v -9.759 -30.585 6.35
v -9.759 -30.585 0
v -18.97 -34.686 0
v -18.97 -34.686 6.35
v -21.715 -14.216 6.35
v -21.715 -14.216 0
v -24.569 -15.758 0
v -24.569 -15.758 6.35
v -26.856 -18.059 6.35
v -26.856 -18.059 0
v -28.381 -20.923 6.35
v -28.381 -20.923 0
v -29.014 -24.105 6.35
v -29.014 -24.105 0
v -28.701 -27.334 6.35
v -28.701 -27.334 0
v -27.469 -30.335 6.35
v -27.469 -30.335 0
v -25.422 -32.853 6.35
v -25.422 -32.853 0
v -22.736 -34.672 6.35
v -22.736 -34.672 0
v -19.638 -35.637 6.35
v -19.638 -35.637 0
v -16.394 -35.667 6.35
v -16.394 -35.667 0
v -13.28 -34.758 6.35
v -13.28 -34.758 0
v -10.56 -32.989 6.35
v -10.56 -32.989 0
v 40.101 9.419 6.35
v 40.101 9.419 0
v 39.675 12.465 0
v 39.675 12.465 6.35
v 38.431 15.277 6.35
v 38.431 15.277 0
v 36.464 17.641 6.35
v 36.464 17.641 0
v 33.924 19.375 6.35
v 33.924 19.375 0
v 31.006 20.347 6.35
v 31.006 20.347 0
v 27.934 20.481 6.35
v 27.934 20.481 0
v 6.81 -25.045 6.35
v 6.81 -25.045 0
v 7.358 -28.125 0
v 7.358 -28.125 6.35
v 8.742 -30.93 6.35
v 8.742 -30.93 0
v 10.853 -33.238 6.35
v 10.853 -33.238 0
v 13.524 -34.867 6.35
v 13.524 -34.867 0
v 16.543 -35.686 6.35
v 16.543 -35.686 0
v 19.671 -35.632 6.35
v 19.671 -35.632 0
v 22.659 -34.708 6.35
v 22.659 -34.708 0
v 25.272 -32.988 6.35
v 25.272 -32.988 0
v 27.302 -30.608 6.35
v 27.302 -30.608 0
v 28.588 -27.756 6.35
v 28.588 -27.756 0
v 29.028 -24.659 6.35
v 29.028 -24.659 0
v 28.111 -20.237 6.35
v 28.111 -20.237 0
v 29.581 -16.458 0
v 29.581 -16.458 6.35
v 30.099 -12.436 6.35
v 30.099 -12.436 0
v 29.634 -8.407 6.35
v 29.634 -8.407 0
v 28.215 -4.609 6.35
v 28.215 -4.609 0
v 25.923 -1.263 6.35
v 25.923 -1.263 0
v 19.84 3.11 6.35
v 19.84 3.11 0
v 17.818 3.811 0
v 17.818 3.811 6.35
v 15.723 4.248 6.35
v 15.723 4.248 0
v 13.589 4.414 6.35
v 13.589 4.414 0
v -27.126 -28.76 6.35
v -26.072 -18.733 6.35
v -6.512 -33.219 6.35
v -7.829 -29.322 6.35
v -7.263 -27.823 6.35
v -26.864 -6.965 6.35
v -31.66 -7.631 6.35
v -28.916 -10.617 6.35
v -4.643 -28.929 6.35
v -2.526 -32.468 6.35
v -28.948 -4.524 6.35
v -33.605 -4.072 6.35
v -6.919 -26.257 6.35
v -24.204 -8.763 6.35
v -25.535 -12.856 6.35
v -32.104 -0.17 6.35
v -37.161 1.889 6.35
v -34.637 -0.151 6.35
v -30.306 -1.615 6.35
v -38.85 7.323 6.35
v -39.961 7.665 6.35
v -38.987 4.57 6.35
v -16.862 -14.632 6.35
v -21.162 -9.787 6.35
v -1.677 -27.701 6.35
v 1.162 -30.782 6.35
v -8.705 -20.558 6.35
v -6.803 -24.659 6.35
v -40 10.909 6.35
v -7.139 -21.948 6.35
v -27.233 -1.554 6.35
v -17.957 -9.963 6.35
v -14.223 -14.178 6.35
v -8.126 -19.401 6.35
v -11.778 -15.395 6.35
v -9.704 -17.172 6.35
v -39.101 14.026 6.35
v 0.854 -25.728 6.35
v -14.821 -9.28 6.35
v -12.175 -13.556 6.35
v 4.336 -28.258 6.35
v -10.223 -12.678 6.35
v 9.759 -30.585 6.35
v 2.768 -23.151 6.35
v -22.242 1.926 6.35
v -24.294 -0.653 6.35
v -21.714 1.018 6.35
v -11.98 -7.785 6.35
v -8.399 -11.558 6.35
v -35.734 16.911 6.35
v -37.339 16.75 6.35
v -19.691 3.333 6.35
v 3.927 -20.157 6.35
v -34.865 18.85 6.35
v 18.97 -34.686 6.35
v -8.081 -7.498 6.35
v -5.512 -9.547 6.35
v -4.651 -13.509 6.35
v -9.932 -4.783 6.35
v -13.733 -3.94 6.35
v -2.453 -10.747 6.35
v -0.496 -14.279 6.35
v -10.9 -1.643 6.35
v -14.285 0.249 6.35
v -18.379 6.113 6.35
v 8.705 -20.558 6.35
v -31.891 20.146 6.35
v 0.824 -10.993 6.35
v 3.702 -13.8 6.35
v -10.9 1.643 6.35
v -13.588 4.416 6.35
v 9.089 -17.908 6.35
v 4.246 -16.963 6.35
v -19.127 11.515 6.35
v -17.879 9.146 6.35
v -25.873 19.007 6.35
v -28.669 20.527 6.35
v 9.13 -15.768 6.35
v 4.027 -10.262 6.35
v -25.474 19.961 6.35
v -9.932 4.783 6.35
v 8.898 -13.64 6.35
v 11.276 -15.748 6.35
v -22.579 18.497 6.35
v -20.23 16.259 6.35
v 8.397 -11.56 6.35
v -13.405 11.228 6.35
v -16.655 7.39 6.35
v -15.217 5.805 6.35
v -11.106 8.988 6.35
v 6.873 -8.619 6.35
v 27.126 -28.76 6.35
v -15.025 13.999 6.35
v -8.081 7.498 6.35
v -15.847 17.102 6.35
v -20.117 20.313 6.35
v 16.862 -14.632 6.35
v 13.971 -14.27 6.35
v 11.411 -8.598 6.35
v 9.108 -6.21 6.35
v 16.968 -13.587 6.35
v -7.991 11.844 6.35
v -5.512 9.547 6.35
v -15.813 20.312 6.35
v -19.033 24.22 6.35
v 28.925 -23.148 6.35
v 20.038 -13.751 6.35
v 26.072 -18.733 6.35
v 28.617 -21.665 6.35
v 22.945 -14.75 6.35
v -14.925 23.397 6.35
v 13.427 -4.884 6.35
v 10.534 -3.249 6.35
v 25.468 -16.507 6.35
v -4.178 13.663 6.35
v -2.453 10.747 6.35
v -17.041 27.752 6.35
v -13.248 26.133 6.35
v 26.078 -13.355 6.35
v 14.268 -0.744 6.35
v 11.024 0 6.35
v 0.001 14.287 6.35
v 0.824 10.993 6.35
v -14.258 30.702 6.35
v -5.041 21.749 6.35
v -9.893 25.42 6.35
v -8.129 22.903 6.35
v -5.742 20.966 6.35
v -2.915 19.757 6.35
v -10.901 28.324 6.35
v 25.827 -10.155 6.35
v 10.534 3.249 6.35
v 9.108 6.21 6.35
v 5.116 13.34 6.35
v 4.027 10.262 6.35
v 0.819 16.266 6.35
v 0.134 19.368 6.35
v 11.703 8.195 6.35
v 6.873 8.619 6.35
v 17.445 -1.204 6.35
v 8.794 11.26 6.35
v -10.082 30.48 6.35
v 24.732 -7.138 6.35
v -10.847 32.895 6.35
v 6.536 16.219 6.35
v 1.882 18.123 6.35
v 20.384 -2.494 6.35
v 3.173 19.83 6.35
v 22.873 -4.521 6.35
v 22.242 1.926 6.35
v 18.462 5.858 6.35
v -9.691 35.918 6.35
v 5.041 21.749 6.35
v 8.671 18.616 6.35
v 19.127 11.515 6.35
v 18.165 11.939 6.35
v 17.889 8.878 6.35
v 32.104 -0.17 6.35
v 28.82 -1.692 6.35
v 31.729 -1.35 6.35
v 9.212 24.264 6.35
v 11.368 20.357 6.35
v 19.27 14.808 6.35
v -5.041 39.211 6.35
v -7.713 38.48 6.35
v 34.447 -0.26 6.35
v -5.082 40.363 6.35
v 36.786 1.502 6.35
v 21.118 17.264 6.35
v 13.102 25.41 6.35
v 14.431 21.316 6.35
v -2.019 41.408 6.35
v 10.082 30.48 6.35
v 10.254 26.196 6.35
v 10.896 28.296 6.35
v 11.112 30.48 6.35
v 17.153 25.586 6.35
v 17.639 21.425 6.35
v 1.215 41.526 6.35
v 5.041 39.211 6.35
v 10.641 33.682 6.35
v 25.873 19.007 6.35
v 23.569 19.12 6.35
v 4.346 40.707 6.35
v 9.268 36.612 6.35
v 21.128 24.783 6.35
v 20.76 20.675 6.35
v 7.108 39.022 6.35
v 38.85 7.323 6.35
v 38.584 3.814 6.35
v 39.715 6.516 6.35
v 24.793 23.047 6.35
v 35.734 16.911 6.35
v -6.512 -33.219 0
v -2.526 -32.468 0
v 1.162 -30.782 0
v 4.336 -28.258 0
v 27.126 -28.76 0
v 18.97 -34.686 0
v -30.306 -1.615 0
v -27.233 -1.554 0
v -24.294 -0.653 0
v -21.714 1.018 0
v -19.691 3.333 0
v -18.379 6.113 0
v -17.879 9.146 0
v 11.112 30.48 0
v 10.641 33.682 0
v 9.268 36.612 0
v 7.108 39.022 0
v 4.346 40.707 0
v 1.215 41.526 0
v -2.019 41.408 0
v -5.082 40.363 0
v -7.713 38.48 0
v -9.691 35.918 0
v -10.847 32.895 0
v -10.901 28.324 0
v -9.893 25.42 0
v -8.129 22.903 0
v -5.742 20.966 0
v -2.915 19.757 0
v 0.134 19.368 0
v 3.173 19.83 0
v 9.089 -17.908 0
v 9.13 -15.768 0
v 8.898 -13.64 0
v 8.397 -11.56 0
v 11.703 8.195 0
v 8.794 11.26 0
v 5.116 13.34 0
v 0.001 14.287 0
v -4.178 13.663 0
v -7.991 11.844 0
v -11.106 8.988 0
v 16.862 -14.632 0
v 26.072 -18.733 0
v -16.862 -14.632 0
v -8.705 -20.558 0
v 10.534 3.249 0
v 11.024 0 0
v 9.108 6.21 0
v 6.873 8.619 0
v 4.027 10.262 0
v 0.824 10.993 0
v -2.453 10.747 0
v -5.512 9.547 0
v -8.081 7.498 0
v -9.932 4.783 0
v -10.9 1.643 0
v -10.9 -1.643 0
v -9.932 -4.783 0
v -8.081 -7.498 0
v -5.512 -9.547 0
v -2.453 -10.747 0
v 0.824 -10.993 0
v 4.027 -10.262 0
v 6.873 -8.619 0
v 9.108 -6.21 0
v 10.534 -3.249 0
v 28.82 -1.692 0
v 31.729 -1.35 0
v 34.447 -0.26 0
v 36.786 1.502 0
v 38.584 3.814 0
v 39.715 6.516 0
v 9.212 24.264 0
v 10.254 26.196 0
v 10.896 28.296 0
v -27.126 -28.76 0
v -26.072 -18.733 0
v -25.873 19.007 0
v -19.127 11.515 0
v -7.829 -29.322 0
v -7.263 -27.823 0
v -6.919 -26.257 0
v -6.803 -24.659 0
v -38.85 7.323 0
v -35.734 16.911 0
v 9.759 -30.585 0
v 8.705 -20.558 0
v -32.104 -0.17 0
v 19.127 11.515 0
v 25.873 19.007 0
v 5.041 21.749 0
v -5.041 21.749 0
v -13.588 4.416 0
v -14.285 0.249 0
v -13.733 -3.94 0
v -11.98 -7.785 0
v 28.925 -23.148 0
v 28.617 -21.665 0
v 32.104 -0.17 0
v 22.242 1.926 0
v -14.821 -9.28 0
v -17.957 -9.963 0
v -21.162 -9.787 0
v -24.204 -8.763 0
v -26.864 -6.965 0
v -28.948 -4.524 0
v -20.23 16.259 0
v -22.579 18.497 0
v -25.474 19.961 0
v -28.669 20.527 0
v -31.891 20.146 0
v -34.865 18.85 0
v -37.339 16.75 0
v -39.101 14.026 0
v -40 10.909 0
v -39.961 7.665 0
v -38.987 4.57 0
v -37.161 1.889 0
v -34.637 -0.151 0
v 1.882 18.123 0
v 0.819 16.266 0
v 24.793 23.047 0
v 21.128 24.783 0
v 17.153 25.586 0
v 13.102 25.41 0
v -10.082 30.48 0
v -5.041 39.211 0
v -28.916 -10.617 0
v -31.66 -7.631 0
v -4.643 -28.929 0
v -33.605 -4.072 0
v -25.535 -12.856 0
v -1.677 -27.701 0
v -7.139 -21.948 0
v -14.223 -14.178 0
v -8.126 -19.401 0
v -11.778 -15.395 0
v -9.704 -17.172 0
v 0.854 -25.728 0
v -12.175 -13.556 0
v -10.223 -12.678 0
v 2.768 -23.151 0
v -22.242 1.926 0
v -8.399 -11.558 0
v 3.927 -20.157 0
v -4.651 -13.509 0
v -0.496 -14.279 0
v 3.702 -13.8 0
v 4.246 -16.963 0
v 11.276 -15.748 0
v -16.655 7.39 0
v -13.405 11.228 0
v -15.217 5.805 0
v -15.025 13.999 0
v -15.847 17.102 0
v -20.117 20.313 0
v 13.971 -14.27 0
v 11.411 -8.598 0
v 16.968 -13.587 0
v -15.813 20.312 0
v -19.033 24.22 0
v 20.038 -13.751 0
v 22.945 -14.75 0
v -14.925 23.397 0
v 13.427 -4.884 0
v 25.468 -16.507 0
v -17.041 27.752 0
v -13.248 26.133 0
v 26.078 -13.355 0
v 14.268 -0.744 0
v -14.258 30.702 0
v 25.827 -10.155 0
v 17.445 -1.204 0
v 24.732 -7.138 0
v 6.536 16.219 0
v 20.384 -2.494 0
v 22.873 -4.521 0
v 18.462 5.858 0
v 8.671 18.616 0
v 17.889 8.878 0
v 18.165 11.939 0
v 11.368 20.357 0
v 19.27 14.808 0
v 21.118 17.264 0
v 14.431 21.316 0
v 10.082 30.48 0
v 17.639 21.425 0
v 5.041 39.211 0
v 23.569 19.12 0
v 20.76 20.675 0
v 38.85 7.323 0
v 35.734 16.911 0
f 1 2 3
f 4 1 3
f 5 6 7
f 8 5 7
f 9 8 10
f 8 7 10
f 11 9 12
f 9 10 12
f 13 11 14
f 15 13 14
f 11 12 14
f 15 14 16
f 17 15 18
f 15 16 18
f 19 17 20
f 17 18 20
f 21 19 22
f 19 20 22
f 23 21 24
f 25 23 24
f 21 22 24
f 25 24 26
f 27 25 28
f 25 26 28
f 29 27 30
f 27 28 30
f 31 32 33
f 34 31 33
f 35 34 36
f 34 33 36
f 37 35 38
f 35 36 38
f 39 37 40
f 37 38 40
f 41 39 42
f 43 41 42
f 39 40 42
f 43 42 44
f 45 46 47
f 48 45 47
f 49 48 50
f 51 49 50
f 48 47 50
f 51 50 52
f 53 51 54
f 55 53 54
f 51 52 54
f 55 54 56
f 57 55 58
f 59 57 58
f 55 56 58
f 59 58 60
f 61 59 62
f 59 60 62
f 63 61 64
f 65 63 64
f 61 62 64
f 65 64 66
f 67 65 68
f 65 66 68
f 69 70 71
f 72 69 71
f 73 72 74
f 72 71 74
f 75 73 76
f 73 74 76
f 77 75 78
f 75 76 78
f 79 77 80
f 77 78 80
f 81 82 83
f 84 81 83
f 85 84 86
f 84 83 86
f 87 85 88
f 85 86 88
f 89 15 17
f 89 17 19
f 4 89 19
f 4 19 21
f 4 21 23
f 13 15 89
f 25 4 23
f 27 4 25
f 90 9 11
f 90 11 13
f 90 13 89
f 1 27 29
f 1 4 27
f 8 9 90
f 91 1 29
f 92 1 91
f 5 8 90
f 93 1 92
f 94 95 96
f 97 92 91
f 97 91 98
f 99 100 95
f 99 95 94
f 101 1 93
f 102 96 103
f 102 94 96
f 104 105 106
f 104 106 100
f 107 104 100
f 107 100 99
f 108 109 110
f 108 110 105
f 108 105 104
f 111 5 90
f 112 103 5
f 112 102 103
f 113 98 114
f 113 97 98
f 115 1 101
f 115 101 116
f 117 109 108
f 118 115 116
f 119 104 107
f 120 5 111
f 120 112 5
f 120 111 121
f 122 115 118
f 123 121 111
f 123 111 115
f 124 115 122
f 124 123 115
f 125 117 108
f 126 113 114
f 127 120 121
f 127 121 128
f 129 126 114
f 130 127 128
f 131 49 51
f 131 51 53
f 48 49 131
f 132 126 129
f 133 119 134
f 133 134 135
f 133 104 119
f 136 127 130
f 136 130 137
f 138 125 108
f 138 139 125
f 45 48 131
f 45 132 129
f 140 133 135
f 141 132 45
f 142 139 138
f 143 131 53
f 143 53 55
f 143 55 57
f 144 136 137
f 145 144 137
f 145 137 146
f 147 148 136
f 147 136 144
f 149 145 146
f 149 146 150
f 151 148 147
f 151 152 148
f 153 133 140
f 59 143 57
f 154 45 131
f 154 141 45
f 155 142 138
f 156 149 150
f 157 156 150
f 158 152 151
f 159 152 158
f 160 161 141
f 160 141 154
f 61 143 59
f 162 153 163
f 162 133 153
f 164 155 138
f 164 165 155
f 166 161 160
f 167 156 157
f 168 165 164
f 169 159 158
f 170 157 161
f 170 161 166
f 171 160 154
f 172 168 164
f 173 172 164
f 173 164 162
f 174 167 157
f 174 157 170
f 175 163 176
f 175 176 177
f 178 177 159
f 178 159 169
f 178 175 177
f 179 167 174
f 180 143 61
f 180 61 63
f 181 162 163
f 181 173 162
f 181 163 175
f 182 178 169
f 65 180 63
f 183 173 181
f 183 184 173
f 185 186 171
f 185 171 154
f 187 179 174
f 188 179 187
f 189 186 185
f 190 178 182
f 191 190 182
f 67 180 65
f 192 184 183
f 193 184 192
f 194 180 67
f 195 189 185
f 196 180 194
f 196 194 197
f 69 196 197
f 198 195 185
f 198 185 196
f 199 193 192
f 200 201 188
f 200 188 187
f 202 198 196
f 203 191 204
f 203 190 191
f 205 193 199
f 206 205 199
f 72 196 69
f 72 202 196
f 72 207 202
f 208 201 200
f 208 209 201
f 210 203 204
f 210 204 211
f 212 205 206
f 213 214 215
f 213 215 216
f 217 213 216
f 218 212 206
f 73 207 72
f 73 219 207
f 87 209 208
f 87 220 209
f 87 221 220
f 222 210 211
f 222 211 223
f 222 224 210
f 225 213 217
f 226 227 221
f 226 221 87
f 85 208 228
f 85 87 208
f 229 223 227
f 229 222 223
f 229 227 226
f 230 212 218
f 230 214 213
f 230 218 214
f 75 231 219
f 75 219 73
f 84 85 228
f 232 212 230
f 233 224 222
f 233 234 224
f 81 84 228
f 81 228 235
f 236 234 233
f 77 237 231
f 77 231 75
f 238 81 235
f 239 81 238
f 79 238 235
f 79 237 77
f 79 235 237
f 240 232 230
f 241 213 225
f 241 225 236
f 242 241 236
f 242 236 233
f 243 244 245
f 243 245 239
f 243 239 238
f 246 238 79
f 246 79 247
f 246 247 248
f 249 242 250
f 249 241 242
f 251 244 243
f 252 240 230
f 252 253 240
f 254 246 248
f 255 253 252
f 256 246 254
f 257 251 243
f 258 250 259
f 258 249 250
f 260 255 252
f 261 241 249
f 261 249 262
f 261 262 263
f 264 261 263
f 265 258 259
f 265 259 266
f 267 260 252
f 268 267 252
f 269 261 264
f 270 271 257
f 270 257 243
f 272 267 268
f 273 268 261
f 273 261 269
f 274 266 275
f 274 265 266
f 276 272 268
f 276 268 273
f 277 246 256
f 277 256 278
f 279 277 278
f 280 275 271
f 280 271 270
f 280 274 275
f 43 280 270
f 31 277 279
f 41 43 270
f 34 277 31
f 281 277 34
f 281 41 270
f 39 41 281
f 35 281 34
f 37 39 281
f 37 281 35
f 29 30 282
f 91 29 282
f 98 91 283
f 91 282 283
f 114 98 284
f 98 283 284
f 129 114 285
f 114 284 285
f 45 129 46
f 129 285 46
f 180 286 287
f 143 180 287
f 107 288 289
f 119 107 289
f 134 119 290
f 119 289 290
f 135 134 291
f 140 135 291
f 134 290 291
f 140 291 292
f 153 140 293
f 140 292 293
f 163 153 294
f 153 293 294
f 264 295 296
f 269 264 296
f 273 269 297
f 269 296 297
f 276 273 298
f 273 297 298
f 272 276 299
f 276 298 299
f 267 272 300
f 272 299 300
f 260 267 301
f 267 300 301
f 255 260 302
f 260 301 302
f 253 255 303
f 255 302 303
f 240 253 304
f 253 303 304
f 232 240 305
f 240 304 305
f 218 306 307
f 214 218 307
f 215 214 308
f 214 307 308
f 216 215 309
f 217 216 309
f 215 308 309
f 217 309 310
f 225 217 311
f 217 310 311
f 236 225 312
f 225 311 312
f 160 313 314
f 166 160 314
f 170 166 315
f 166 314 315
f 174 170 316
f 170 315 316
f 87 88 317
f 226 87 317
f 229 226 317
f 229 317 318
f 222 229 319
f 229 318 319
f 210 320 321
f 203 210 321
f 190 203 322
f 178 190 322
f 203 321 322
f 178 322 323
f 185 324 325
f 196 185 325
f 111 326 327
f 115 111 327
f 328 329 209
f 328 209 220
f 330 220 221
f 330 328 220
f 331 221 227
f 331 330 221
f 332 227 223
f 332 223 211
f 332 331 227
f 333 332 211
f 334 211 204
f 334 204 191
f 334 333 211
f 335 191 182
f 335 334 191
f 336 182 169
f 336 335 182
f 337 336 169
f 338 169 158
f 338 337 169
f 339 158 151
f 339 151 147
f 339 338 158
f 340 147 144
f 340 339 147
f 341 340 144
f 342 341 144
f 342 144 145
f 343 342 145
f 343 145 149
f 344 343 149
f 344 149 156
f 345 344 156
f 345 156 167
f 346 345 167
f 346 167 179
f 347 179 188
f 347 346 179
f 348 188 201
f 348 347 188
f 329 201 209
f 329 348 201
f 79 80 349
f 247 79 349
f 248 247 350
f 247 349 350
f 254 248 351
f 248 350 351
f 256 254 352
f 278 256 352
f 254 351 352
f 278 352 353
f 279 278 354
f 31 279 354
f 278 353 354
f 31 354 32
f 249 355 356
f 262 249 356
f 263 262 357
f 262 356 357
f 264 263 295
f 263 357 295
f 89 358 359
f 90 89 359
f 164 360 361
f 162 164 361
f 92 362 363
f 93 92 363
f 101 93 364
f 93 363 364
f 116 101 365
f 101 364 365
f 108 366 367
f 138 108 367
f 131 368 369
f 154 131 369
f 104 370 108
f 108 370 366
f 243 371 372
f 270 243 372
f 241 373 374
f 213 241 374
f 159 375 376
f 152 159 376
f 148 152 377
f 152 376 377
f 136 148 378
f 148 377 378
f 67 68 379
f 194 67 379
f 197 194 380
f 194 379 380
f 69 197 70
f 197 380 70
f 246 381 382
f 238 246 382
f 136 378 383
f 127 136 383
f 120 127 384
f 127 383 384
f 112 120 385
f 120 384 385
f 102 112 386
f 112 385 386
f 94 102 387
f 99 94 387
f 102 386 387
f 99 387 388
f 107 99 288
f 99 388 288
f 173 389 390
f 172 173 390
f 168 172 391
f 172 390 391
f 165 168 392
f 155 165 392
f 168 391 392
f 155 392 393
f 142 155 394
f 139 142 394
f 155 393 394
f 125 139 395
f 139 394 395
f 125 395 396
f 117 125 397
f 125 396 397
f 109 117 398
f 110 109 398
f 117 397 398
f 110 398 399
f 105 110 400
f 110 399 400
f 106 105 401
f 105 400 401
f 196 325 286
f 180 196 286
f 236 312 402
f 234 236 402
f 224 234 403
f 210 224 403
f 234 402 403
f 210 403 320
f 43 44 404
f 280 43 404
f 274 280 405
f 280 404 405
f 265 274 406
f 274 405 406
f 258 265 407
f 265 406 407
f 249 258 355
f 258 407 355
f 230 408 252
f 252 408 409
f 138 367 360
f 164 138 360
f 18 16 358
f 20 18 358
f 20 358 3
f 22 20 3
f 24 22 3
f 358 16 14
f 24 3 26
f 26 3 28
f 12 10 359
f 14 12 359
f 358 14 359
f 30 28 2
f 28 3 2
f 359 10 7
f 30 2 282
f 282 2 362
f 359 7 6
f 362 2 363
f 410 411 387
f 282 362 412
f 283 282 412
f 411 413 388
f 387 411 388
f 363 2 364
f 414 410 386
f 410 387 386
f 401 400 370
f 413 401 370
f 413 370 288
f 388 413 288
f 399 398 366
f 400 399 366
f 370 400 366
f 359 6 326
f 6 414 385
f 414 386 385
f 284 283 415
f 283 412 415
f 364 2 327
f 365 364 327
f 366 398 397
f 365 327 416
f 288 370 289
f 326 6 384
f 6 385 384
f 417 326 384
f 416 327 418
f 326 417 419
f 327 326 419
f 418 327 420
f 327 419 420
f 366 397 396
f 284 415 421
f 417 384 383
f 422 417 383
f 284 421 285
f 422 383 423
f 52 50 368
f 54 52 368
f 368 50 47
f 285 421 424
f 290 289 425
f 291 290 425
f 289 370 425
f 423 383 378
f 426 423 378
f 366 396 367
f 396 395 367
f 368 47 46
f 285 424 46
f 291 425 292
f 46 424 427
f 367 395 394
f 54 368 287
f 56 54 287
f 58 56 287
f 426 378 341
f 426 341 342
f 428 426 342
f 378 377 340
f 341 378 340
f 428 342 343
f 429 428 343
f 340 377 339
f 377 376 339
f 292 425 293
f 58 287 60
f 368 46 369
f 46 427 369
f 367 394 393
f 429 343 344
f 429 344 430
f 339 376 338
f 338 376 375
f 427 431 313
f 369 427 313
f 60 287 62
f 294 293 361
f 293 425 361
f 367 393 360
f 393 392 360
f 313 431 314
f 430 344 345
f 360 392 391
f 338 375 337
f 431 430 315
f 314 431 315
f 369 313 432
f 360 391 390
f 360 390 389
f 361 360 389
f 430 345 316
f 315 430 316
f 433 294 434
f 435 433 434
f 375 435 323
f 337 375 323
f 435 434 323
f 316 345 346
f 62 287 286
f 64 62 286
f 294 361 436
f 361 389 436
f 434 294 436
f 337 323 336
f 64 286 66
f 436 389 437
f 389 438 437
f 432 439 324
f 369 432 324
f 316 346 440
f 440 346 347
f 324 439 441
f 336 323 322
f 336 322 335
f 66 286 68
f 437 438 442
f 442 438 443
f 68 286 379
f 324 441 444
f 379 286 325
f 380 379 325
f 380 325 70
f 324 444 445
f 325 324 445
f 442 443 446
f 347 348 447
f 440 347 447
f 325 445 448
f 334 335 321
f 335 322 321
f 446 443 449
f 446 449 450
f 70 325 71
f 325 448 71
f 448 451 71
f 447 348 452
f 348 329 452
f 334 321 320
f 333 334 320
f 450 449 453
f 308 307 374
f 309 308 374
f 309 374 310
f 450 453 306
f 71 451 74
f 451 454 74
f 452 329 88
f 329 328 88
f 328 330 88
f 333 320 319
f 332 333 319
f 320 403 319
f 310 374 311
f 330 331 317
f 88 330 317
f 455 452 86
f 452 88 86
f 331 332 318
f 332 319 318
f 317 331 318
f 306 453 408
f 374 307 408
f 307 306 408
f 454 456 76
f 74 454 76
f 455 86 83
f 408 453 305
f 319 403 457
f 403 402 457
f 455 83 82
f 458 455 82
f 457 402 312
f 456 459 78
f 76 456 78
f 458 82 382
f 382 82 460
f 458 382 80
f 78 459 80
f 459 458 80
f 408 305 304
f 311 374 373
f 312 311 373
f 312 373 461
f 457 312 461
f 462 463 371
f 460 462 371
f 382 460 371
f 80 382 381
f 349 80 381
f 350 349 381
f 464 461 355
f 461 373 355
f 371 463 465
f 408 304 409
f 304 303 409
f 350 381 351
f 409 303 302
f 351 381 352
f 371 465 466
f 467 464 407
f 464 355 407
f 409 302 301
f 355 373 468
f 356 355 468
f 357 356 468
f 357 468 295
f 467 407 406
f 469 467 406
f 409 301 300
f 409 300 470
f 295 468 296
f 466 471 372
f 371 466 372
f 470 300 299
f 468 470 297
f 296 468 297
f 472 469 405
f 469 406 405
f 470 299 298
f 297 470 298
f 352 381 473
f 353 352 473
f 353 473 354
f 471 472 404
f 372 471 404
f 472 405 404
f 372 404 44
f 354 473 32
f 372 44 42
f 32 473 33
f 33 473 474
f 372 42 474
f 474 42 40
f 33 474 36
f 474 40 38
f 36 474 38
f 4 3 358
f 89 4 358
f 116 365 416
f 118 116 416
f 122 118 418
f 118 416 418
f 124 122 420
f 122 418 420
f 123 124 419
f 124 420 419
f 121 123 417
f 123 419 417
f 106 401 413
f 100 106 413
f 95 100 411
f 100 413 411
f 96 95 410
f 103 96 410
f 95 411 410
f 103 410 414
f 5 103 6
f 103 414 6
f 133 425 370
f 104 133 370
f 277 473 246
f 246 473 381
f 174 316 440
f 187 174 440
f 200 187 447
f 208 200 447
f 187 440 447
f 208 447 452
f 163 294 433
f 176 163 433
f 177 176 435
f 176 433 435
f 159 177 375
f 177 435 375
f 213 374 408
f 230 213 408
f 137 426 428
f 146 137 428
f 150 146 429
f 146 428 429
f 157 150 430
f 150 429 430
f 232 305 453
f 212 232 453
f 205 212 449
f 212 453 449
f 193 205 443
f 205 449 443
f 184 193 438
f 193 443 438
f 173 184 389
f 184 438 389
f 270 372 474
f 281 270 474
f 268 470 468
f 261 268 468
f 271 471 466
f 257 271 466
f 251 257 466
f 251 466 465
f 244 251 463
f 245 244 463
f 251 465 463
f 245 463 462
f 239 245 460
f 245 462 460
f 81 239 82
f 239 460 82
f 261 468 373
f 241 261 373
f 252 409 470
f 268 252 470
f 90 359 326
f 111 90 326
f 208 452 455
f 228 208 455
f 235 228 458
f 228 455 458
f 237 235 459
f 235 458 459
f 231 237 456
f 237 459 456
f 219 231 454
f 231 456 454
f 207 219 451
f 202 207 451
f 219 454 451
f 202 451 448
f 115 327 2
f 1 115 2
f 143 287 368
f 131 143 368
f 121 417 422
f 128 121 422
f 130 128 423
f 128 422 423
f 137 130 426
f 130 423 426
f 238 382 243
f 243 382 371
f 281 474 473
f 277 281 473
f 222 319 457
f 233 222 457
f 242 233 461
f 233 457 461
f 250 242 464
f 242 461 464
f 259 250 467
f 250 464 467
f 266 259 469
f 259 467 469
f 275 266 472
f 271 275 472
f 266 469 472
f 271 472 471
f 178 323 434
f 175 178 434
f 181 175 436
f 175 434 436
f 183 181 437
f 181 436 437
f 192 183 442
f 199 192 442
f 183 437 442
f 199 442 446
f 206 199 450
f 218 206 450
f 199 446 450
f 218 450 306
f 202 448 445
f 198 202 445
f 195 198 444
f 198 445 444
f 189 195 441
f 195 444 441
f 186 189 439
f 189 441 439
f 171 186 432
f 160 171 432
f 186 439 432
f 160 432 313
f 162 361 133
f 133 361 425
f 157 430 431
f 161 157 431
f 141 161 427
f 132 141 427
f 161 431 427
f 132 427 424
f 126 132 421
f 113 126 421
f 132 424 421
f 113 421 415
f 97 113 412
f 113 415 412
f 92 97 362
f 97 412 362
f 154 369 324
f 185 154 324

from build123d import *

# Parameters (mm, degrees)
F0_R     = 11.0236
F1_DEPTH = 6.35


with BuildPart() as f1:
    # F0 (on Top) → F1 (new body)
    with BuildSketch(Plane.XY):
        with BuildLine():
            ThreePointArc((-10.9013073569, 28.323810268), (-5.7416369548, 20.9657337998), (3.1731830809, 19.8301847253))
            ThreePointArc((3.1731830809, 19.8301847253), (5.9411817185, 22.3894795146), (9.2116796693, 24.2644860293))
            ThreePointArc((9.2116796693, 24.2644860293), (10.6266750815, 27.2301641638), (11.1125, 30.48))
            ThreePointArc((11.1125, 30.48), (1.2150273194, 41.5258754684), (-10.8468007628, 32.8954853473))
            ThreePointArc((-10.8468007628, 32.8954853473), (-11.1117102623, 30.6124813052), (-10.9013073569, 28.323810268))
        make_face()
        Polygon((10.0819790757, 30.48), (5.0409895379, 21.74875), (-5.0409895379, 21.74875), (-10.0819790757, 30.48), (-5.0409895379, 39.21125), (5.0409895379, 39.21125), align=None, mode=Mode.SUBTRACT)
        with BuildLine():
            ThreePointArc((-30.3062335558, -1.6152206797), (-21.7138611437, 1.0181468036), (-17.8790589041, 9.1457405282))
            ThreePointArc((-17.8790589041, 9.1457405282), (-19.4577342712, 12.5691292531), (-20.2303319881, 16.2589665183))
            ThreePointArc((-20.2303319881, 16.2589665183), (-37.3389530107, 16.7504560982), (-34.6373114666, -0.1506565358))
            ThreePointArc((-34.6373114666, -0.1506565358), (-32.5479071329, -1.1080874889), (-30.3062335558, -1.6152206797))
        make_face()
        Polygon((-22.2420418444, 1.9264674079), (-32.103705488, -0.1696939086), (-38.8498662602, 7.3226766721), (-35.7343633889, 16.9112085692), (-25.8726997453, 19.0073698857), (-19.1265389731, 11.514999305), align=None, mode=Mode.SUBTRACT)
        with BuildLine():
            ThreePointArc((-14.2230491705, -14.1778062266), (-11.1849106676, -13.1482774657), (-8.3989318902, -11.5581399608))
            ThreePointArc((-8.3989318902, -11.5581399608), (-10.3627655441, -9.835941568), (-11.980250366, -7.7850020821))
            ThreePointArc((-11.980250366, -7.7850020821), (-22.7179291909, -9.3773746133), (-30.3062335558, -1.6152206797))
            ThreePointArc((-30.3062335558, -1.6152206797), (-32.5479071329, -1.1080874889), (-34.6373114666, -0.1506565358))
            ThreePointArc((-34.6373114666, -0.1506565358), (-30.3789037171, -9.207206787), (-21.7147124417, -14.215892099))
            ThreePointArc((-21.7147124417, -14.215892099), (-17.9721871235, -13.5464815853), (-14.2230491705, -14.1778062266))
        make_face()
        with BuildLine():
            ThreePointArc((-13.5878570147, 4.4161972328), (-12.556806984, 6.8161025973), (-11.1060779195, 8.9881972328))
            ThreePointArc((-11.1060779195, 8.9881972328), (-15.9386394287, 18.7082664756), (-10.9013073569, 28.323810268))
            ThreePointArc((-10.9013073569, 28.323810268), (-11.1117102623, 30.6124813052), (-10.8468007628, 32.8954853473))
            ThreePointArc((-10.8468007628, 32.8954853473), (-18.1441715308, 26.0468709702), (-20.2303319881, 16.2589665183))
            ThreePointArc((-20.2303319881, 16.2589665183), (-18.4808363051, 13.0358684619), (-17.8757026167, 9.4188379885))
            ThreePointArc((-17.8757026167, 9.4188379885), (-17.8765417202, 9.2822789468), (-17.8790589041, 9.1457405282))
            ThreePointArc((-17.8790589041, 9.1457405282), (-15.9610824387, 6.5744409909), (-13.5878570147, 4.4161972328))
        make_face()
        with BuildLine():
            ThreePointArc((-20.2303319881, 16.2589665183), (-19.4577342712, 12.5691292531), (-17.8790589041, 9.1457405282))
            ThreePointArc((-17.8790589041, 9.1457405282), (-17.8765417202, 9.2822789468), (-17.8757026167, 9.4188379885))
            ThreePointArc((-17.8757026167, 9.4188379885), (-18.4808363051, 13.0358684619), (-20.2303319881, 16.2589665183))
        make_face()
        with BuildLine():
            ThreePointArc((0.0011744209, 14.2874999517), (2.6022320378, 14.0485246439), (5.1163167301, 13.3400134695))
            ThreePointArc((5.1163167301, 13.3400134695), (12.8673082895, 20.9397191658), (23.5688550875, 19.1202981162))
            ThreePointArc((23.5688550875, 19.1202981162), (25.6804925176, 20.0276414155), (27.933619926, 20.4811845569))
            ThreePointArc((27.933619926, 20.4811845569), (19.1651890134, 25.3050583472), (9.2116796693, 24.2644860293))
            ThreePointArc((9.2116796693, 24.2644860293), (6.5773827127, 21.5231203591), (3.1731830809, 19.8301847253))
            ThreePointArc((3.1731830809, 19.8301847253), (1.3204192232, 17.2115054551), (0.0011744209, 14.2874999517))
        make_face()
        with BuildLine():
            ThreePointArc((25.9234631172, -1.2626894327), (23.1295865065, 1.2683300774), (19.8401939006, 3.1099876352))
            ThreePointArc((19.8401939006, 3.1099876352), (22.5022269053, 0.3955472739), (25.9234631172, -1.2626894327))
        make_face()
        with BuildLine():
            ThreePointArc((13.5885828467, 4.4139633516), (14.1116890143, 2.2344774365), (14.2875, 0))
            ThreePointArc((14.2875, 0), (14.2826580685, -0.3719337948), (14.2681355559, -0.7436154983))
            ThreePointArc((14.2681355559, -0.7436154983), (23.8910732953, -5.7668083163), (25.4676608769, -16.5068161571))
            ThreePointArc((25.4676608769, -16.5068161571), (26.9831274861, -18.234718196), (28.1107273058, -20.2374171613))
            ThreePointArc((28.1107273058, -20.2374171613), (29.9889097419, -10.4074848243), (25.9234631172, -1.2626894327))
            ThreePointArc((25.9234631172, -1.2626894327), (22.5022269053, 0.3955472739), (19.8401939006, 3.1099876352))
            ThreePointArc((19.8401939006, 3.1099876352), (16.777146398, 4.0628543779), (13.5885828467, 4.4139633516))
        make_face()
        with BuildLine():
            ThreePointArc((23.5688550875, 19.1202981162), (18.1653343546, 11.9393892838), (19.8401939006, 3.1099876352))
            ThreePointArc((19.8401939006, 3.1099876352), (23.1295865065, 1.2683300774), (25.9234631172, -1.2626894327))
            ThreePointArc((25.9234631172, -1.2626894327), (35.6751577744, 0.5434626743), (40.1007026167, 9.4188379885))
            ThreePointArc((40.1007026167, 9.4188379885), (36.4637830657, 17.6409638207), (27.933619926, 20.4811845569))
            ThreePointArc((27.933619926, 20.4811845569), (25.6804925176, 20.0276414155), (23.5688550875, 19.1202981162))
        make_face()
        Polygon((19.1265389731, 11.514999305), (25.8726997453, 19.0073698857), (35.7343633889, 16.9112085692), (38.8498662602, 7.3226766721), (32.103705488, -0.1696939086), (22.2420418444, 1.9264674079), align=None, mode=Mode.SUBTRACT)
        with BuildLine():
            ThreePointArc((9.0887310931, -17.9081066622), (9.048427485, -14.7005233582), (8.3970316373, -11.5595205754))
            ThreePointArc((8.3970316373, -11.5595205754), (6.1522656603, -12.8950487977), (3.7018759995, -13.799593122))
            ThreePointArc((3.7018759995, -13.799593122), (1.8981870347, -24.5038027118), (-7.8289750516, -29.3220715473))
            ThreePointArc((-7.8289750516, -29.3220715473), (-9.0040026085, -31.2973170358), (-10.5602350025, -32.9885962071))
            ThreePointArc((-10.5602350025, -32.9885962071), (-0.6310235074, -31.737237706), (6.8099016433, -25.0448710159))
            ThreePointArc((6.8099016433, -25.0448710159), (7.3297583374, -21.2786586997), (9.0887310931, -17.9081066622))
        make_face()
        with BuildLine():
            ThreePointArc((-21.7147124417, -14.215892099), (-17.9667228421, -14.6213304272), (-14.2230491705, -14.1778062266))
            ThreePointArc((-14.2230491705, -14.1778062266), (-17.9721871235, -13.5464815853), (-21.7147124417, -14.215892099))
        make_face()
        with BuildLine():
            ThreePointArc((-10.5602350025, -32.9885962071), (-9.0040026085, -31.2973170358), (-7.8289750516, -29.3220715473))
            ThreePointArc((-7.8289750516, -29.3220715473), (-7.0626689668, -27.0461991355), (-6.8031944899, -24.6588379885))
            ThreePointArc((-6.8031944899, -24.6588379885), (-8.8459045981, -18.2380461706), (-14.2230491705, -14.1778062266))
            ThreePointArc((-14.2230491705, -14.1778062266), (-17.9667228421, -14.6213304272), (-21.7147124417, -14.215892099))
            ThreePointArc((-21.7147124417, -14.215892099), (-27.4690014556, -30.3352789746), (-10.5602350025, -32.9885962071))
        make_face()
        Polygon((-8.7053483012, -20.5581276637), (-9.7592020807, -30.5848766032), (-18.9695482694, -34.685586928), (-27.1260406785, -28.7595483134), (-26.0721868991, -18.7327993739), (-16.8618407104, -14.6320890491), align=None, mode=Mode.SUBTRACT)
        with BuildLine():
            ThreePointArc((6.8099016433, -25.0448710159), (8.3536888883, -21.6056084179), (9.0887310931, -17.9081066622))
            ThreePointArc((9.0887310931, -17.9081066622), (7.3297583374, -21.2786586997), (6.8099016433, -25.0448710159))
        make_face()
        with BuildLine():
            ThreePointArc((28.1107273058, -20.2374171613), (26.9831274861, -18.234718196), (25.4676608769, -16.5068161571))
            ThreePointArc((25.4676608769, -16.5068161571), (16.968431003, -13.5867854175), (9.0887310931, -17.9081066622))
            ThreePointArc((9.0887310931, -17.9081066622), (8.3536888883, -21.6056084179), (6.8099016433, -25.0448710159))
            ThreePointArc((6.8099016433, -25.0448710159), (18.1087401348, -35.7696610737), (29.0281944899, -24.6588379885))
            ThreePointArc((29.0281944899, -24.6588379885), (28.7964104226, -22.4010344007), (28.1107273058, -20.2374171613))
        make_face()
        Polygon((16.8618407104, -14.6320890491), (26.0721868991, -18.7327993739), (27.1260406785, -28.7595483134), (18.9695482694, -34.685586928), (9.7592020807, -30.5848766032), (8.7053483012, -20.5581276637), align=None, mode=Mode.SUBTRACT)
        with BuildLine():
            ThreePointArc((14.2681355559, -0.7436154983), (14.2826580685, -0.3719337948), (14.2875, 0))
            ThreePointArc((14.2875, 0), (14.1116890143, 2.2344774365), (13.5885828467, 4.4139633516))
            ThreePointArc((13.5885828467, 4.4139633516), (10.3627655441, 9.835941568), (5.1163167301, 13.3400134695))
            ThreePointArc((5.1163167301, 13.3400134695), (2.6022320378, 14.0485246439), (0.0011744209, 14.2874999517))
            ThreePointArc((0.0011744209, 14.2874999517), (-6.1522656603, 12.8950487977), (-11.1060779195, 8.9881972328))
            ThreePointArc((-11.1060779195, 8.9881972328), (-12.556806984, 6.8161025973), (-13.5878570147, 4.4161972328))
            ThreePointArc((-13.5878570147, 4.4161972328), (-14.1650748299, -1.8663631244), (-11.980250366, -7.7850020821))
            ThreePointArc((-11.980250366, -7.7850020821), (-10.3627655441, -9.835941568), (-8.3989318902, -11.5581399608))
            ThreePointArc((-8.3989318902, -11.5581399608), (-2.6022320378, -14.0485246439), (3.7018759995, -13.799593122))
            ThreePointArc((3.7018759995, -13.799593122), (6.1522656603, -12.8950487977), (8.3970316373, -11.5595205754))
            ThreePointArc((8.3970316373, -11.5595205754), (12.556806984, -6.8161025973), (14.2681355559, -0.7436154983))
        make_face()
        Circle(F0_R, mode=Mode.SUBTRACT)
        with BuildLine():
            ThreePointArc((9.2116796693, 24.2644860293), (5.9411817185, 22.3894795146), (3.1731830809, 19.8301847253))
            ThreePointArc((3.1731830809, 19.8301847253), (6.5773827127, 21.5231203591), (9.2116796693, 24.2644860293))
        make_face()
    extrude(amount=F1_DEPTH)


solid = f1.part
